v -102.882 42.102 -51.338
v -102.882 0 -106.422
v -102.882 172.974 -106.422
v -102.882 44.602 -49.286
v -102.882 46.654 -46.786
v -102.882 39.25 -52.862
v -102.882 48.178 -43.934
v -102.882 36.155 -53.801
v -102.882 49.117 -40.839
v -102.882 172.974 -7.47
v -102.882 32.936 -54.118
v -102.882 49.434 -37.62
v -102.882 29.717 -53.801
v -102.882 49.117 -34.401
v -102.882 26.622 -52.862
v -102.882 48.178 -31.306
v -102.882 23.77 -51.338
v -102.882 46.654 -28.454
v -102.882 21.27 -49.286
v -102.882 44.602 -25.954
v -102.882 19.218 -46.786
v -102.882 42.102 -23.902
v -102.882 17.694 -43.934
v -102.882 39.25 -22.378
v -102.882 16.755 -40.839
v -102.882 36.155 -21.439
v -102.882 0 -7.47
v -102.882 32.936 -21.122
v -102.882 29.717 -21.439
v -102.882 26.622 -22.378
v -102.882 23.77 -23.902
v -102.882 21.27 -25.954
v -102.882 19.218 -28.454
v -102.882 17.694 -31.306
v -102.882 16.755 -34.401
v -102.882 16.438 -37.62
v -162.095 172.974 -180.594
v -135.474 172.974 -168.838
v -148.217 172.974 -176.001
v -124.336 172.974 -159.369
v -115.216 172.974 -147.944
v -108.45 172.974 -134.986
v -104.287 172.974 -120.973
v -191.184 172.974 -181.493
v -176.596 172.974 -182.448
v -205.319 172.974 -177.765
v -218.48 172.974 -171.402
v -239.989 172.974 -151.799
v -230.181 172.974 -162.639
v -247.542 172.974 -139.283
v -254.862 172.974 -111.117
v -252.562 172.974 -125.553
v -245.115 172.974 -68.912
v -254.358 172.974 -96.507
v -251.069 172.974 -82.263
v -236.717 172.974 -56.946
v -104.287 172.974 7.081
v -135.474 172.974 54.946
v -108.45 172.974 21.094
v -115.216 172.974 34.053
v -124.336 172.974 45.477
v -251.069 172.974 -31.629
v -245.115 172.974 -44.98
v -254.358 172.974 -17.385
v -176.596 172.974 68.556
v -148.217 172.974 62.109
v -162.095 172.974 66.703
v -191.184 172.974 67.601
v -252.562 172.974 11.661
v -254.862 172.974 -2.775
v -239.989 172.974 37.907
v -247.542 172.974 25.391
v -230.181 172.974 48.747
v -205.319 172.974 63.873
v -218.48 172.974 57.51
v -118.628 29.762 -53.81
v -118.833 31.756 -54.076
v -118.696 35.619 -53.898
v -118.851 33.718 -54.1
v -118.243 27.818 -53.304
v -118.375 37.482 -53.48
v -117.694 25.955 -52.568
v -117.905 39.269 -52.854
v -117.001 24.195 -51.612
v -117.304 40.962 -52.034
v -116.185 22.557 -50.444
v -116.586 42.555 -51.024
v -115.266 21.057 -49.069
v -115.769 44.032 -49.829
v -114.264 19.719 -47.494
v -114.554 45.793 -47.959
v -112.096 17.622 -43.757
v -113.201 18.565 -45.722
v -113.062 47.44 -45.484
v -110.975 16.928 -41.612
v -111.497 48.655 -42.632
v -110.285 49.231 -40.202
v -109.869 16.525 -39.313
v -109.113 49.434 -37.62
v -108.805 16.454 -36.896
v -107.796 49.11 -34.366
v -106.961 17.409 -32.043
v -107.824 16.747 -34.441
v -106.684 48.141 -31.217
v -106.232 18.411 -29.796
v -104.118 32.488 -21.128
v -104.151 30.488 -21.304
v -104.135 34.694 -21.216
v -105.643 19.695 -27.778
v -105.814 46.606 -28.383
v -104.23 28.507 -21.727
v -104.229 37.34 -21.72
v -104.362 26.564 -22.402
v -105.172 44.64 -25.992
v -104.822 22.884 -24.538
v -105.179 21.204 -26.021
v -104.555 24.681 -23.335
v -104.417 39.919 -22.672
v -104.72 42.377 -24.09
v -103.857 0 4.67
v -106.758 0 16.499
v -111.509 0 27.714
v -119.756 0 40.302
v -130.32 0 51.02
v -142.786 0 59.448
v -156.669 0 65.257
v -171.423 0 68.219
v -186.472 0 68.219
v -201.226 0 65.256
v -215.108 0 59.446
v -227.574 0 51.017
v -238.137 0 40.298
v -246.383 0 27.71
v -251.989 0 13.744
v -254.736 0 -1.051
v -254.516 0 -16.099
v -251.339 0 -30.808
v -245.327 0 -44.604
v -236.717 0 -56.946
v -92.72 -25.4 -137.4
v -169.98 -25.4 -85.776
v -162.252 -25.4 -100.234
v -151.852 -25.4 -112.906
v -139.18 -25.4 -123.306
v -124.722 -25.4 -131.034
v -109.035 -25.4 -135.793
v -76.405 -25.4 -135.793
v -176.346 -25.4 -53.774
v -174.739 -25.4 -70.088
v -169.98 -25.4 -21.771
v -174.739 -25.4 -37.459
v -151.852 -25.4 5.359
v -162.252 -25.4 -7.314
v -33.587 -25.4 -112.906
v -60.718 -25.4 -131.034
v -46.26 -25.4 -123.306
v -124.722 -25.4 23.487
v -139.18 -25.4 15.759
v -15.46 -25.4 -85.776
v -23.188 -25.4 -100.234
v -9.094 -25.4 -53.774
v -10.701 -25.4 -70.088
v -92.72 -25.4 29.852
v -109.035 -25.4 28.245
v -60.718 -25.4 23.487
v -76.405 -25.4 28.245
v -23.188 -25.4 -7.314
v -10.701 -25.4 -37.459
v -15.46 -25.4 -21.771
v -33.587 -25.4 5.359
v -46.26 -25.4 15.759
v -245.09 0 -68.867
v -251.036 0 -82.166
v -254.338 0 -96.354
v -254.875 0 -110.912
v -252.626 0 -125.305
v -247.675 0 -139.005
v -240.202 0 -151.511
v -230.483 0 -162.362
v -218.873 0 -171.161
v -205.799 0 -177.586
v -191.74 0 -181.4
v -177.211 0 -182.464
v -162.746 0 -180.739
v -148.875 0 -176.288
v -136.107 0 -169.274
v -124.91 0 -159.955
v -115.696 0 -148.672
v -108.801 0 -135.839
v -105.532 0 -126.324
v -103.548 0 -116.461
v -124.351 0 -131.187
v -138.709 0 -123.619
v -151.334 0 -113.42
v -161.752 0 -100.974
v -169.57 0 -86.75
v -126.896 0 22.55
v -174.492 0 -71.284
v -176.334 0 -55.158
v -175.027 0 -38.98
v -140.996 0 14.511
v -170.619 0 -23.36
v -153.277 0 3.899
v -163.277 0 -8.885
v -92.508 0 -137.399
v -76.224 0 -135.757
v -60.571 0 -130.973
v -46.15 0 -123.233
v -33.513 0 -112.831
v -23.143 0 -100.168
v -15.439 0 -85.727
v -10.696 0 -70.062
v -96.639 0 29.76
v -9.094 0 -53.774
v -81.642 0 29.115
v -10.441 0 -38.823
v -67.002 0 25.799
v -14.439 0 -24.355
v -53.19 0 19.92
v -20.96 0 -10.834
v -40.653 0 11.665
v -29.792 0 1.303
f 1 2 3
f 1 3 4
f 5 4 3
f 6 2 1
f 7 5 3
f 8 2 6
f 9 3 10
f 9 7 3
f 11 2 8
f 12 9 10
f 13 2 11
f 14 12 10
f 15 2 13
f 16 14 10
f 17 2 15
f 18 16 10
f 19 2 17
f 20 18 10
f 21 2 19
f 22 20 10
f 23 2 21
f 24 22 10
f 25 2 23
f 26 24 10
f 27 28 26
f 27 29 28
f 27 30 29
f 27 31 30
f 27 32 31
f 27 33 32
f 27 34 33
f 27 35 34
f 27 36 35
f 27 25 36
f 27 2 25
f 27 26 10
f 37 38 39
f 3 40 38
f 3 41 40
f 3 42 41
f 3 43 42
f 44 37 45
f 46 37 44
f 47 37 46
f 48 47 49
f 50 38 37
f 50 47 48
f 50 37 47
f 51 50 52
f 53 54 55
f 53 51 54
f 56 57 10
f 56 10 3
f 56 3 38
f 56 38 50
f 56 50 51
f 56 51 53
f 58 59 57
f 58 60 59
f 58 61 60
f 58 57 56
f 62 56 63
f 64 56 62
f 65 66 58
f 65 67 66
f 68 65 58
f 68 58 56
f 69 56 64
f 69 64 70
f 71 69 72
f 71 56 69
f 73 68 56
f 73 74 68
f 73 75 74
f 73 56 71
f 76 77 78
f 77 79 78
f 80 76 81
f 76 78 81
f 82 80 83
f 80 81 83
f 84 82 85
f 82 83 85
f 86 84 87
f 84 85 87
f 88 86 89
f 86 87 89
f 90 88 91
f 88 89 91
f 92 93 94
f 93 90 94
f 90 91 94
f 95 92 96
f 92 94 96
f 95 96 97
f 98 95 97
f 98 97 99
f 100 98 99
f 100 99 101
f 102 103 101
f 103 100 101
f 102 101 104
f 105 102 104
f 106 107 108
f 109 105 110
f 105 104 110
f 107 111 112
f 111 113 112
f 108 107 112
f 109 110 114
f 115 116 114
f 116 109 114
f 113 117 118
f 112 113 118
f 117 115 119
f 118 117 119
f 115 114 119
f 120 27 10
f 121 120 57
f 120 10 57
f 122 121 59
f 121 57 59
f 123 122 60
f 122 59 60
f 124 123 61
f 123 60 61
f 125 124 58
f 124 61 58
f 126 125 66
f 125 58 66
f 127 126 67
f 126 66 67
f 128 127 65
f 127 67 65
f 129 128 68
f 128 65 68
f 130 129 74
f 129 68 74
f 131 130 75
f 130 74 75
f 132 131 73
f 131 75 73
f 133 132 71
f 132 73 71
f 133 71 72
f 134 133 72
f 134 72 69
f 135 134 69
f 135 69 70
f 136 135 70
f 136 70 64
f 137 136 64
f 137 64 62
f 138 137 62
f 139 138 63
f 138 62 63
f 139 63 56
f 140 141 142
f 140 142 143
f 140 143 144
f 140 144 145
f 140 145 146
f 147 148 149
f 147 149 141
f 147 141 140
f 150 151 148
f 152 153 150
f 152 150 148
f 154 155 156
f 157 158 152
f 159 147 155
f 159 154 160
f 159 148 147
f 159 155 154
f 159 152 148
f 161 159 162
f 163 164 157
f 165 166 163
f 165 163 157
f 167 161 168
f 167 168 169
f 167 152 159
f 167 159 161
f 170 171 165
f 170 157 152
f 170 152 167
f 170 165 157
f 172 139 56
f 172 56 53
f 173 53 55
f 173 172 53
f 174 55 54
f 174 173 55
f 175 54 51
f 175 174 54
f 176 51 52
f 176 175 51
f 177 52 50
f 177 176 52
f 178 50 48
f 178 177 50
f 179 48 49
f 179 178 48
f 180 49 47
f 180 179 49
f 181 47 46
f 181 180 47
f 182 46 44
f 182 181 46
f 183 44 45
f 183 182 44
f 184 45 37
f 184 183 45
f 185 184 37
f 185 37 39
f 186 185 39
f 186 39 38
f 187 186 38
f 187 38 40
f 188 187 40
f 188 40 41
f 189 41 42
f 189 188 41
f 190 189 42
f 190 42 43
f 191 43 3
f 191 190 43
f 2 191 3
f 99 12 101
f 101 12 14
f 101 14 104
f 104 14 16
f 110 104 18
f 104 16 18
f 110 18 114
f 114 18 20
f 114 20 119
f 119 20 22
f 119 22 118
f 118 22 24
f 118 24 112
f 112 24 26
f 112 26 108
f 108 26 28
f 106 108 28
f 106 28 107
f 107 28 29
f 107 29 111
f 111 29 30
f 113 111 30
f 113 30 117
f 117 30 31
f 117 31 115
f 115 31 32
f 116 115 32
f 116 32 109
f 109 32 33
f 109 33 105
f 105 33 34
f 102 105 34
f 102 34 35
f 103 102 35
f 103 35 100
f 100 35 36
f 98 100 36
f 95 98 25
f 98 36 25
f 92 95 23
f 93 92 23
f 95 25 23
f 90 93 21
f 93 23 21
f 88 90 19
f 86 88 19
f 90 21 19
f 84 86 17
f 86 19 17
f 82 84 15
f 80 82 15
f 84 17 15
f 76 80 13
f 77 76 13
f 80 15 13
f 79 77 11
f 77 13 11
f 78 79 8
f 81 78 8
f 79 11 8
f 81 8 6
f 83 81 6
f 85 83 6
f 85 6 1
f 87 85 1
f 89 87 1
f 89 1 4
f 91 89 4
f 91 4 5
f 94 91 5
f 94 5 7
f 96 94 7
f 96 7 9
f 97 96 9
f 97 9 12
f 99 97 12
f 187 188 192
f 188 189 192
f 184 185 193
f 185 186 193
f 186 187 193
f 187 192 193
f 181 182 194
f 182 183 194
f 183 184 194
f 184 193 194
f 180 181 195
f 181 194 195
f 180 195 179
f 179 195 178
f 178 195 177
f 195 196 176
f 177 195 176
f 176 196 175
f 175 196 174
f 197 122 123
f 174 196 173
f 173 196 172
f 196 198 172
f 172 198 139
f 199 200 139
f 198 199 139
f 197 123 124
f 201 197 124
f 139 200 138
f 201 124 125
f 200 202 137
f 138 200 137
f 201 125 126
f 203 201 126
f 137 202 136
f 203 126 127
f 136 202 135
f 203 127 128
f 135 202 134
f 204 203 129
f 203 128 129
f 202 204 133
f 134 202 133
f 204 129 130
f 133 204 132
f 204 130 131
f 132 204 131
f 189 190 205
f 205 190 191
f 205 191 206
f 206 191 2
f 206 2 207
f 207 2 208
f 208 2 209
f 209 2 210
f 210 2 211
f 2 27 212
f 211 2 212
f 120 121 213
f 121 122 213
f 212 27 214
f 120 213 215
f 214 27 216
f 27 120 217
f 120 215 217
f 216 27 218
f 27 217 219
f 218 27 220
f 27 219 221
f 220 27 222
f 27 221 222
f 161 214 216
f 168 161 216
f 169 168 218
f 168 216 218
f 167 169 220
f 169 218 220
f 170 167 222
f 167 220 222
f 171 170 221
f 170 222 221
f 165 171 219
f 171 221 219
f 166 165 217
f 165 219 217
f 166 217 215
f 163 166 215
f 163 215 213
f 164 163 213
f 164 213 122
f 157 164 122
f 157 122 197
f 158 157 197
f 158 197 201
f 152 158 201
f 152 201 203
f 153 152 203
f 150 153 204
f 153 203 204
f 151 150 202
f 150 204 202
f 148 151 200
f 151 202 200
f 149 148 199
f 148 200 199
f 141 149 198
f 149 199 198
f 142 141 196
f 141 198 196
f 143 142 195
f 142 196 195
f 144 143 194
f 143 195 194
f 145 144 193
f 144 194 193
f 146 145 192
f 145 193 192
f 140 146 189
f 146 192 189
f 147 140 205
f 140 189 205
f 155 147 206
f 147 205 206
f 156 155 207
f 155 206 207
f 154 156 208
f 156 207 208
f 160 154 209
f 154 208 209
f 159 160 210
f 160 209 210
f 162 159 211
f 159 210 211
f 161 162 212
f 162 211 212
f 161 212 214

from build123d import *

# Parameters (mm, degrees)
F0_W       = 76.0625377297
F0_H       = 98.9513029344
F1_DEPTH   = 172.974
F2_R       = 16.4981826782
F3_DEPTH   = 207.518
F1_FACE_W  = 76.0625377297
F1_FACE_H  = 172.974
F1_FACE1_W = 76.0625377297
F1_FACE1_H = 172.974
F6_R       = 83.6259605226
F7_DEPTH   = 25.4


with BuildPart() as f1:
    # F0 (on Front) → F1 (new body)
    with BuildSketch(Plane.XZ):
        with Locations((-140.9135572612, -56.9459532853)):
            Rectangle(F0_W, F0_H)
    extrude(amount=-F1_DEPTH)

    # F2 (on Right) → F3 (cut)
    with BuildSketch(Plane.YZ):
        with Locations((32.9360701144, -37.6199260354)):
            Circle(F2_R)
    extrude(amount=-F3_DEPTH, mode=Mode.SUBTRACT)

    # F1_face (on face) → F4 (revolve)
    with BuildSketch(Plane(origin=(-140.9135572612, 86.487, -106.4216047525), x_dir=(1, 0, 0), z_dir=(0, 0, -1))):
        Rectangle(F1_FACE_W, F1_FACE_H)
    revolve(axis=Axis((-178.9448261261, 86.487, -106.4216047525), (0, -1, 0)))

    # F1_face1 (on face) → F5 (revolve)
    with BuildSketch(Plane(origin=(-140.9135572612, 86.487, -7.4703018181), x_dir=(1, 0, 0), z_dir=(0, 0, 1))):
        Rectangle(F1_FACE1_W, F1_FACE1_H)
    revolve(axis=Axis((-178.9448261261, 86.487, -7.4703018181), (0, -1, 0)))

    # F6 (on Front) → F7 (join)
    with BuildSketch(Plane.XZ):
        with Locations((-92.7199497819, -53.7736974657)):
            Circle(F6_R)
    extrude(amount=F7_DEPTH)


solid = f1.part
